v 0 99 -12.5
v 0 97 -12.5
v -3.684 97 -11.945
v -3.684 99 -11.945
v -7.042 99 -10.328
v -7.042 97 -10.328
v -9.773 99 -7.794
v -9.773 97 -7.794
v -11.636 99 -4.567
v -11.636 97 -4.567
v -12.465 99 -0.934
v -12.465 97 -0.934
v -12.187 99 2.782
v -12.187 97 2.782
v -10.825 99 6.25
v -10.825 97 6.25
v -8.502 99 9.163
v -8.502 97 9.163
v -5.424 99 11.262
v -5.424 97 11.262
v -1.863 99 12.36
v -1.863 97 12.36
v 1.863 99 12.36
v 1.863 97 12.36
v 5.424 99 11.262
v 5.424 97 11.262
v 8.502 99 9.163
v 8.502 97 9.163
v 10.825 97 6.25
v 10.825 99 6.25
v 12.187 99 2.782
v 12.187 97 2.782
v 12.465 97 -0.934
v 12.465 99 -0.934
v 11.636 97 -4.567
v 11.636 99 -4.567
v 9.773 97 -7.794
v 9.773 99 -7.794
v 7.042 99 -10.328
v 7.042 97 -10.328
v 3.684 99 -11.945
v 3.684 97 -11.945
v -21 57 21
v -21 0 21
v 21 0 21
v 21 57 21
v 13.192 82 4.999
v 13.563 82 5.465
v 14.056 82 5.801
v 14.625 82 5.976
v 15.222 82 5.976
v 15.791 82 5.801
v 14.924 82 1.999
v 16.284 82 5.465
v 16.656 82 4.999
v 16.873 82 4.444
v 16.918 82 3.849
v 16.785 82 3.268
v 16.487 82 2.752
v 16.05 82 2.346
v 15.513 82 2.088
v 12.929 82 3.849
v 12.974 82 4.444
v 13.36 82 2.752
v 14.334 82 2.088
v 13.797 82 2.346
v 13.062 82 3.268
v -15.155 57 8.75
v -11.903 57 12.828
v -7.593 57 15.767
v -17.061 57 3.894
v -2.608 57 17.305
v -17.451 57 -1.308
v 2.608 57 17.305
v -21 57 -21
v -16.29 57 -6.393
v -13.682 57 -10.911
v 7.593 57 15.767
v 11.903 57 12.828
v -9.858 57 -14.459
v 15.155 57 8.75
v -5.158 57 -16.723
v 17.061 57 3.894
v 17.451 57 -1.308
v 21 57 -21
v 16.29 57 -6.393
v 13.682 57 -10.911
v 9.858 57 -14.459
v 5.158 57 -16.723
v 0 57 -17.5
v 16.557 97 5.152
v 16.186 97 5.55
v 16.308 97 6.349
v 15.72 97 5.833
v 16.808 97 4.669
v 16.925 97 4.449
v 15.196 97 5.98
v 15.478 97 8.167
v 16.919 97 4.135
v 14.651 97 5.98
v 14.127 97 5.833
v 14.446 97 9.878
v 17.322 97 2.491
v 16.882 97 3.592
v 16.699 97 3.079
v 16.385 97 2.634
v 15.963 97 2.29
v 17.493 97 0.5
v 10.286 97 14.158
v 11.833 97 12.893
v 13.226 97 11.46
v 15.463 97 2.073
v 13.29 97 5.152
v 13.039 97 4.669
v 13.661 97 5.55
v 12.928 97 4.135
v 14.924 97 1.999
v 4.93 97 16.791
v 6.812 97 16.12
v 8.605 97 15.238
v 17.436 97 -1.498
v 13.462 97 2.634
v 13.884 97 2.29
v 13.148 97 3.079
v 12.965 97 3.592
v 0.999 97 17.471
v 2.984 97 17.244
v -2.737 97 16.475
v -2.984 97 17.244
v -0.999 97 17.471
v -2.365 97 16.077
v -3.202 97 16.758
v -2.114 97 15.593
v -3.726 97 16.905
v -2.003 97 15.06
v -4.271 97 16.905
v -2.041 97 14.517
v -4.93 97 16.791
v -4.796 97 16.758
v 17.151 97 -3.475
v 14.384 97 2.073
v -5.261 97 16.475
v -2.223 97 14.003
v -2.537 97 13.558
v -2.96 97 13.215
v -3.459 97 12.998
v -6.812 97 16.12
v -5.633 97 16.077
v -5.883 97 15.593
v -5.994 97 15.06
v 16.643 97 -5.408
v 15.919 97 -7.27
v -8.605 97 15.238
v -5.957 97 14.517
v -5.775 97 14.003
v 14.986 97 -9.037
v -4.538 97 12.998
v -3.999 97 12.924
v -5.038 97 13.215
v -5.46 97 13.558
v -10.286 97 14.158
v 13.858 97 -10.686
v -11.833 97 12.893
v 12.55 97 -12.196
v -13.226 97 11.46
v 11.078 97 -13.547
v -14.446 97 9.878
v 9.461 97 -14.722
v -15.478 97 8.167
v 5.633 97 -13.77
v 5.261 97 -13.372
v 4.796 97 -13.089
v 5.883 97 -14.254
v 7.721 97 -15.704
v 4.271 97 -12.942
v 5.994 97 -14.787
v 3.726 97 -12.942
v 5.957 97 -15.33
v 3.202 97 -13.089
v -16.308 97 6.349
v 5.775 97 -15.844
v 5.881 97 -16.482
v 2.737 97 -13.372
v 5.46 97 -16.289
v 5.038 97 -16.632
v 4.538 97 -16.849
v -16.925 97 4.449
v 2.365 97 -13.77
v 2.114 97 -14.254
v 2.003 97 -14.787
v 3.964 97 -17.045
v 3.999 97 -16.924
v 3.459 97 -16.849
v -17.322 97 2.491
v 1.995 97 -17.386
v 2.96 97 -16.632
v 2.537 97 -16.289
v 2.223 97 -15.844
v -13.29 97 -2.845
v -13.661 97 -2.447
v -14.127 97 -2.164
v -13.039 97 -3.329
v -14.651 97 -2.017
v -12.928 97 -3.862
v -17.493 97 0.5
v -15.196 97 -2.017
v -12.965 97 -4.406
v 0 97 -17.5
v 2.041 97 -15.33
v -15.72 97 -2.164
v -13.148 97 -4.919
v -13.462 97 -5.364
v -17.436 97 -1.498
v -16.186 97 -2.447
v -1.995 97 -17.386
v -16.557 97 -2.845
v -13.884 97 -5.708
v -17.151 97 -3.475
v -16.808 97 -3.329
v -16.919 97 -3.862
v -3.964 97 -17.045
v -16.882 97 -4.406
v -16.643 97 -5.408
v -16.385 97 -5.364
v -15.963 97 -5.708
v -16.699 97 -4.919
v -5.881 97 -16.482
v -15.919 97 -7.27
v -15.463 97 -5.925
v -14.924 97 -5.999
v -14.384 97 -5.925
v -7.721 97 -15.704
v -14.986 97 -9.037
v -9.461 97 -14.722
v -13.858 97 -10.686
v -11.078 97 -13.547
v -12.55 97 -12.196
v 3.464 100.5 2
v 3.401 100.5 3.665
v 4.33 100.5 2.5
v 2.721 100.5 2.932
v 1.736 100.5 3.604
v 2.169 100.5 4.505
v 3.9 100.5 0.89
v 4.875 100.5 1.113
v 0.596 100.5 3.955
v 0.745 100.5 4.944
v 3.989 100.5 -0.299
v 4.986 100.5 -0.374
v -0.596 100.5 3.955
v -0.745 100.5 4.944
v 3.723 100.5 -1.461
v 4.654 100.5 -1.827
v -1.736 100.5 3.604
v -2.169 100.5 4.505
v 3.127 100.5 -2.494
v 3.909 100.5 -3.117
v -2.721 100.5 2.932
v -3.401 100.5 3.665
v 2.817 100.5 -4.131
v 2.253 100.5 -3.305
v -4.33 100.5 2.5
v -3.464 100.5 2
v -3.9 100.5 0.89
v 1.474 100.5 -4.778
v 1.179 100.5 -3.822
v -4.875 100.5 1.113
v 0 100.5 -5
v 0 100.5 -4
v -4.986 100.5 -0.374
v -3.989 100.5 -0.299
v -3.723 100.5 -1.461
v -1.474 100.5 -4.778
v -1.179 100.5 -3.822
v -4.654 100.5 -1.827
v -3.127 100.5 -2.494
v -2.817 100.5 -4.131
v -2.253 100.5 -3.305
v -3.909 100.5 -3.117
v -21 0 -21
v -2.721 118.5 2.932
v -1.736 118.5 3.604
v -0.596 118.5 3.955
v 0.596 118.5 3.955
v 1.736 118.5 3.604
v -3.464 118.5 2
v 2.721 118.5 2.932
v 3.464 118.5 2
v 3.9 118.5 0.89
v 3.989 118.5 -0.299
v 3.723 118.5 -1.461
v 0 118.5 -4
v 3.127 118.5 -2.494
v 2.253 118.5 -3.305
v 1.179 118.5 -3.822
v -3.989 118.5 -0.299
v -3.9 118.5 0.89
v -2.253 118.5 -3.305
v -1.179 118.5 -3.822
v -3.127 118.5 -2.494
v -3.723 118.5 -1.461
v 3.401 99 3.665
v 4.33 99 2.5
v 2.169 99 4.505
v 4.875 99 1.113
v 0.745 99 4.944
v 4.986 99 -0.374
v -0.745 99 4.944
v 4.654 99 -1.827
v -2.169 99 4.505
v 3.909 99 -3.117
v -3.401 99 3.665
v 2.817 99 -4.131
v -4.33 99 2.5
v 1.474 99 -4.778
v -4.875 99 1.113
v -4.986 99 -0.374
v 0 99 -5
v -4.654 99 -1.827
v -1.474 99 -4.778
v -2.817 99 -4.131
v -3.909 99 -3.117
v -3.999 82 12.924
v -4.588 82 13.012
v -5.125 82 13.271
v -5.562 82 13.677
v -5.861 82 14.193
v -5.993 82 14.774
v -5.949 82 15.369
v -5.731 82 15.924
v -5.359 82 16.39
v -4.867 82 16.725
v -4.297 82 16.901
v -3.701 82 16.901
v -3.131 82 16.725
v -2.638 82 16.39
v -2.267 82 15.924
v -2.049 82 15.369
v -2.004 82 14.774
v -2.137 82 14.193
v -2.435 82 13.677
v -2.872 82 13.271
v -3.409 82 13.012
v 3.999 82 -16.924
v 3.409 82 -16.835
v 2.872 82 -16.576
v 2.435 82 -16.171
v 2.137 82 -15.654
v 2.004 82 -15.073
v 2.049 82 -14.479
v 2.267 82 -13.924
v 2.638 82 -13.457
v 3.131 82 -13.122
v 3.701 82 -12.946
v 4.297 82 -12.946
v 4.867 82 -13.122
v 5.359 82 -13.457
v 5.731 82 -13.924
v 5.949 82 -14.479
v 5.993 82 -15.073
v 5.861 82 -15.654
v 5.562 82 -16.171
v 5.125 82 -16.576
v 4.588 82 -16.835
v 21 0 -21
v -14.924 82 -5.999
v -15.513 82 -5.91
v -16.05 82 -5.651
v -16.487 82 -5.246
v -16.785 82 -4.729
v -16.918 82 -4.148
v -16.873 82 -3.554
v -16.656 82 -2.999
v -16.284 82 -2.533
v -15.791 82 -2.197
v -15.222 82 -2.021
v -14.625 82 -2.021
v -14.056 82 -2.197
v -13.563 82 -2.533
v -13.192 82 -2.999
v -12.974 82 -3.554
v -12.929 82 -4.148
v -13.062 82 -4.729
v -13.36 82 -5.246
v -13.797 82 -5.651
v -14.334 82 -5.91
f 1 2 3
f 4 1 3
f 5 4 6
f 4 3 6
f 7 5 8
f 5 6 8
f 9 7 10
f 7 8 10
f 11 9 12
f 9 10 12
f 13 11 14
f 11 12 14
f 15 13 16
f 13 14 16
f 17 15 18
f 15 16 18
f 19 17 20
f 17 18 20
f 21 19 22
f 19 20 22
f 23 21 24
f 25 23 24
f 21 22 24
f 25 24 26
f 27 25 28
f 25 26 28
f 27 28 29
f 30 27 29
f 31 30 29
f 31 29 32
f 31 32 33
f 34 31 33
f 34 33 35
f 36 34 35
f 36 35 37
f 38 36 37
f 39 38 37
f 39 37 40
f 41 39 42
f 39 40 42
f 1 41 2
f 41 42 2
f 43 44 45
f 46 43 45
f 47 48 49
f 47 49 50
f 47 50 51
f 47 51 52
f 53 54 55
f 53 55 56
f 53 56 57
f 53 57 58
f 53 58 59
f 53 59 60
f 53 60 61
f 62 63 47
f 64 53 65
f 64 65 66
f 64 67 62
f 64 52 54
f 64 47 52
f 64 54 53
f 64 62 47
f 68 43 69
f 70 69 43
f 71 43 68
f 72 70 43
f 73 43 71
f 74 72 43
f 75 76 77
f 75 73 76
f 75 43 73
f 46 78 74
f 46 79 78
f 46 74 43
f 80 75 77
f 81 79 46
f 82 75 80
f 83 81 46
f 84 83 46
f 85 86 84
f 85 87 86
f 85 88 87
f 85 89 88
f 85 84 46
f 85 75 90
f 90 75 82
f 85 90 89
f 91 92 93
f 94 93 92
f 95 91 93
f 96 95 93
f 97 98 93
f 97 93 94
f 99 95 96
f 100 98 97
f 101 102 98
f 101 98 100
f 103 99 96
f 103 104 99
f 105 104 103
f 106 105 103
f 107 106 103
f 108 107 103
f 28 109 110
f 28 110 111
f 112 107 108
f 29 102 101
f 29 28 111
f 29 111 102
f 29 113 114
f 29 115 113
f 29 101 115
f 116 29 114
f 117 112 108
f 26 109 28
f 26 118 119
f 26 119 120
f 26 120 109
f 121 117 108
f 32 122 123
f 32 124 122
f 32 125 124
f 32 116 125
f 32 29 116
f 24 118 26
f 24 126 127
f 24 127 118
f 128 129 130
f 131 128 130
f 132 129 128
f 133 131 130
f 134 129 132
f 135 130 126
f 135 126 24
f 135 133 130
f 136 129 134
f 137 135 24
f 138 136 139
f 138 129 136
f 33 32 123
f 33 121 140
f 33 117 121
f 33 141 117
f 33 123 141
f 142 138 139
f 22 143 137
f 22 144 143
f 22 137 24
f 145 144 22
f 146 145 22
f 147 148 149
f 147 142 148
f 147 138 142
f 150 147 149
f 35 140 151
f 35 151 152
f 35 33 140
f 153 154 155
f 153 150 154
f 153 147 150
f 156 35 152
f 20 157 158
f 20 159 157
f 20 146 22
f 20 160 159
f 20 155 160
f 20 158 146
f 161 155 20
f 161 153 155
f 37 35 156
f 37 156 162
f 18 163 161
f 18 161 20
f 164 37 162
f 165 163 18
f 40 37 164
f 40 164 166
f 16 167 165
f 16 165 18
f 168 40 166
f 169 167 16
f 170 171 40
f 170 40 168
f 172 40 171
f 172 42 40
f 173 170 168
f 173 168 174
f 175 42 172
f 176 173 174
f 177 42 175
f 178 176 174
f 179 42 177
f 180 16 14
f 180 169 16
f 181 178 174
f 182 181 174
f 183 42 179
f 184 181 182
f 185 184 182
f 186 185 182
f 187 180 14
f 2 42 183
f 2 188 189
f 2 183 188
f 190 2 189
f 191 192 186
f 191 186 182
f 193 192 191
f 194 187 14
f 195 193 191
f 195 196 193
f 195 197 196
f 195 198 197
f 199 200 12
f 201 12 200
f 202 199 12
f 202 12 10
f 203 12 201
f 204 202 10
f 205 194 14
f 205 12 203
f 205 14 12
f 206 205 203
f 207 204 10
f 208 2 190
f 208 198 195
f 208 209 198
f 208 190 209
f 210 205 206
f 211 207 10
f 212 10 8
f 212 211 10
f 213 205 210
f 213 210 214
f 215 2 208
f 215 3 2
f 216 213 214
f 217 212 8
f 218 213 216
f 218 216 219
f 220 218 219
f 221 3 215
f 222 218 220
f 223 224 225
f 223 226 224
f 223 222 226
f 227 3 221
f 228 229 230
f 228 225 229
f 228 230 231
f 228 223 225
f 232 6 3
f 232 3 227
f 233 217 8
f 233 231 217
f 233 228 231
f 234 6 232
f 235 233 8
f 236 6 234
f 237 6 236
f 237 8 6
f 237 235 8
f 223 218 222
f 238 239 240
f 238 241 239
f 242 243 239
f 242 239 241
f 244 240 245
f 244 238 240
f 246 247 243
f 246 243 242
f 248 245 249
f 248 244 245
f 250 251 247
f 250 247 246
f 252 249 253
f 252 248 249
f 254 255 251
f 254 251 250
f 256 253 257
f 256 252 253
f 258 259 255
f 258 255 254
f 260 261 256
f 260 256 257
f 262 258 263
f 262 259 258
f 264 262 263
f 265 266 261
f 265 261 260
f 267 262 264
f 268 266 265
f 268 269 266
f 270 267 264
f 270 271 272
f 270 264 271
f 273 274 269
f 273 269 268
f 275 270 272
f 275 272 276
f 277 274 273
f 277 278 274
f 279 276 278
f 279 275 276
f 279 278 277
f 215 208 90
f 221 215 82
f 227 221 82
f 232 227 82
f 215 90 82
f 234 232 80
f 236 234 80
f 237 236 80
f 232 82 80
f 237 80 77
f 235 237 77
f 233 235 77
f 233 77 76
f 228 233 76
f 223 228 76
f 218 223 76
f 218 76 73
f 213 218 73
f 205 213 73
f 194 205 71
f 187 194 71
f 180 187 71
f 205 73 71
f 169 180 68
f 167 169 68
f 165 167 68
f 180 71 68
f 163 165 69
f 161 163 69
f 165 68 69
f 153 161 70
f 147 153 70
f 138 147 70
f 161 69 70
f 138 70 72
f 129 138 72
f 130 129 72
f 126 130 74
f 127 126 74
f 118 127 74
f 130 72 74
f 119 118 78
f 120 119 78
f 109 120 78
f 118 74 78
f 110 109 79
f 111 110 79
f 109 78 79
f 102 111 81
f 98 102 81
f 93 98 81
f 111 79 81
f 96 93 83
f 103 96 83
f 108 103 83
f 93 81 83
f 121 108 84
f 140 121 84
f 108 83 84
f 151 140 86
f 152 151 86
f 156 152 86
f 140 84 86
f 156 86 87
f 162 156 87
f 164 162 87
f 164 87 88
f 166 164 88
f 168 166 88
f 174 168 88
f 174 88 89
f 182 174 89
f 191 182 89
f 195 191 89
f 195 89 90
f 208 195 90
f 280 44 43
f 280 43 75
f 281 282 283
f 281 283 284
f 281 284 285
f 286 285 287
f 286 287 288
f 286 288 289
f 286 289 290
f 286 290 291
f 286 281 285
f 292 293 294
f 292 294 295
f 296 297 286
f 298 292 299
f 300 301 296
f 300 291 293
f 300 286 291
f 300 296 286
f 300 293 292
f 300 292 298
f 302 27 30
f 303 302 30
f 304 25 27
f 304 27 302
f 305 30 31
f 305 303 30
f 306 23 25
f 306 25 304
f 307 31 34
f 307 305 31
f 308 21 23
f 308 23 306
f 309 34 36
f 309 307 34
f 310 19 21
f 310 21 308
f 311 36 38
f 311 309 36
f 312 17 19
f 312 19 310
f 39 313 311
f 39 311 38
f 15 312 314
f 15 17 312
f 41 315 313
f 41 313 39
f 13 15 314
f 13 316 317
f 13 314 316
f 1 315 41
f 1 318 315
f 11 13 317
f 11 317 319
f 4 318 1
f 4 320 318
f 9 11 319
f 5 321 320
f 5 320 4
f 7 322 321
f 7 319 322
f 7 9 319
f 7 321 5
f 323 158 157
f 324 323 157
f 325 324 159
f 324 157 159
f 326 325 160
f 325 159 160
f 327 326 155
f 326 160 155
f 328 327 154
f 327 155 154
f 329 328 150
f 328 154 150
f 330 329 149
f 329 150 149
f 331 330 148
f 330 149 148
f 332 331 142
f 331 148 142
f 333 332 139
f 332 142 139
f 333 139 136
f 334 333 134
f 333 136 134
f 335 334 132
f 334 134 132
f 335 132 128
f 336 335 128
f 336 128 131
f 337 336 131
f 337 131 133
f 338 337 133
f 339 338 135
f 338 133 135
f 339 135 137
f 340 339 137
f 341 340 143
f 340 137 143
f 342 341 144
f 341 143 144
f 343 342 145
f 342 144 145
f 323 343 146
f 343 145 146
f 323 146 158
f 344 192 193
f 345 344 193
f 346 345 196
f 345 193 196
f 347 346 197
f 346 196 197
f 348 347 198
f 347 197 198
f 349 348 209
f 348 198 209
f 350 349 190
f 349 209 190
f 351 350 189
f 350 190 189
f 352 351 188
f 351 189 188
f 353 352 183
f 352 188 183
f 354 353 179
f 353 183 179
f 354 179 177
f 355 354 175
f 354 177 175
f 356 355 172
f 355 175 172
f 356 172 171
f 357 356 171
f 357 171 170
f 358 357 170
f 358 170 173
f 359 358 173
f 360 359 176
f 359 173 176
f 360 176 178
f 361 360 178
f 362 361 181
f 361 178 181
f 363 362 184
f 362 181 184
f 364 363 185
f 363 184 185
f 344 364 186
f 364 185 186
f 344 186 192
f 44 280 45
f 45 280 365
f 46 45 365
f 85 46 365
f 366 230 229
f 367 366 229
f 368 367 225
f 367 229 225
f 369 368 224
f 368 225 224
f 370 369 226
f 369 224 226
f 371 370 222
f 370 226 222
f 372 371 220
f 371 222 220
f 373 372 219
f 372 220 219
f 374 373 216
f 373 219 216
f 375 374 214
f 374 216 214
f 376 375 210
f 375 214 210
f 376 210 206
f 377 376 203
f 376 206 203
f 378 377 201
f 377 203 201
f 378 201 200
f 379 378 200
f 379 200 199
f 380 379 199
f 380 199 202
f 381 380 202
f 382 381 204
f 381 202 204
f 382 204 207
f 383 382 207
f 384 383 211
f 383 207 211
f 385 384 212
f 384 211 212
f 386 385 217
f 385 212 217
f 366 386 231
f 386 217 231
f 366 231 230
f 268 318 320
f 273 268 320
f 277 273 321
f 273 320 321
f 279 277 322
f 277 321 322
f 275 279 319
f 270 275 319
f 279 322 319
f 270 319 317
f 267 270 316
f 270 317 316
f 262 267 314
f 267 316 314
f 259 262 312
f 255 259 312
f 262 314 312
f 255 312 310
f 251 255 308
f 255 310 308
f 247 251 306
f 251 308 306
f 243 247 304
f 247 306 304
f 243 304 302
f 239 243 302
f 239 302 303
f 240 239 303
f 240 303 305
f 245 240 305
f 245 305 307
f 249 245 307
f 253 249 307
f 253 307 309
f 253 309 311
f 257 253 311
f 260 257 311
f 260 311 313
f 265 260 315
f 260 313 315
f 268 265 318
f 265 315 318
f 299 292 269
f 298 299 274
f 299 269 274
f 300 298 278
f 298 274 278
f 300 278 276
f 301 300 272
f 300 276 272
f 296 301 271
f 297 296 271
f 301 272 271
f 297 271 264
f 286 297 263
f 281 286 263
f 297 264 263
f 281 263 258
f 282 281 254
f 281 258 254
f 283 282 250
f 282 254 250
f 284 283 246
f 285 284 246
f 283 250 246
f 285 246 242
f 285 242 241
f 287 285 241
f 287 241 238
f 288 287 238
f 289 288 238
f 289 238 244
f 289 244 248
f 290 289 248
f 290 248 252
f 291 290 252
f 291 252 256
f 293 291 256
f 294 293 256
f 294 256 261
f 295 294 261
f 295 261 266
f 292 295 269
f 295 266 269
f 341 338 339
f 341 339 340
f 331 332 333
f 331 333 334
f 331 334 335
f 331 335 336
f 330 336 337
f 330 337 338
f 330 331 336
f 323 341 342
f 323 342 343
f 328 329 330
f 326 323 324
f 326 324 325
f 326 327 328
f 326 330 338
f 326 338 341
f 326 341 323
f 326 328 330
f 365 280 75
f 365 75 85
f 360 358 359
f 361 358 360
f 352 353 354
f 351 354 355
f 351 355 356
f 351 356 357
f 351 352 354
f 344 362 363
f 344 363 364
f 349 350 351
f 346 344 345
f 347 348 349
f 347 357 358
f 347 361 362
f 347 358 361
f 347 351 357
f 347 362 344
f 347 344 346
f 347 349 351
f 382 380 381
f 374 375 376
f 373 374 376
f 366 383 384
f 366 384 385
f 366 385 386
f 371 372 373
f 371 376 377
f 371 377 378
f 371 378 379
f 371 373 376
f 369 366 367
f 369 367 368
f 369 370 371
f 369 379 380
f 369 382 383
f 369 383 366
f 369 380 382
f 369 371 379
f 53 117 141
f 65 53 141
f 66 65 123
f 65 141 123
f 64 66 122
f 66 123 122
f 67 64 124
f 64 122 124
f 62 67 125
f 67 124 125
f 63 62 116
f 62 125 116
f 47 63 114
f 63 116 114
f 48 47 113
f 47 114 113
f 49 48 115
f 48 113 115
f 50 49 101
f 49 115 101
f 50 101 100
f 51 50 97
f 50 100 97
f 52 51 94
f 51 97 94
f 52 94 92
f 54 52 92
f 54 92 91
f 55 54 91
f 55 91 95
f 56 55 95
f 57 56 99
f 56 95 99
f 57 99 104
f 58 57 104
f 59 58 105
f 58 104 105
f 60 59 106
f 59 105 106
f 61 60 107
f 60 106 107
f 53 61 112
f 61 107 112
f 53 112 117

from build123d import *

# Parameters (mm, degrees)
SKETCH_1_W          = 42
SKETCH_1_H          = 42
EXTRUDE_1_DEPTH     = 57
EXTRUDE_START       = 57
SKETCH_2_R          = 17.5
EXTRUDE_2_DEPTH     = 40
EXTRUDE_START_2     = 97
SKETCH_3_R          = 12.5
EXTRUDE_3_DEPTH     = 2
EXTRUDE_START_3     = 99
SKETCH_4_R          = 5
EXTRUDE_4_DEPTH     = 1.5
EXTRUDE_START_4     = 100.5
SKETCH_5_R          = 4
EXTRUDE_5_DEPTH     = 18
CUT_EXTRUDE_START   = 97
SKETCH_6_R          = 2
CUT_EXTRUDE_2_DEPTH = 15


with BuildPart() as part:
    # 草图1 → 凸台-拉伸1 (new body)
    with BuildSketch(Plane(origin=(0, 0, 0), x_dir=(1, 0, 0), z_dir=(0, 1, 0))):
        Rectangle(SKETCH_1_W, SKETCH_1_H)
    extrude(amount=EXTRUDE_1_DEPTH)

    # 草图2 → 凸台-拉伸2 (add)
    with BuildSketch(Plane(origin=(0, 0, 0), x_dir=(1, 0, 0), z_dir=(0, 1, 0)).offset(EXTRUDE_START)):
        with Locations(Location((0, 0, 0), (0, 0, 90))):
            Circle(SKETCH_2_R)
    extrude(amount=EXTRUDE_2_DEPTH)

    # 草图3 → 凸台-拉伸3 (add)
    with BuildSketch(Plane(origin=(0, 0, 0), x_dir=(1, 0, 0), z_dir=(0, 1, 0)).offset(EXTRUDE_START_2)):
        with Locations(Location((0, 0, 0), (0, 0, 90))):
            Circle(SKETCH_3_R)
    extrude(amount=EXTRUDE_3_DEPTH)

    # 草图4 → 凸台-拉伸4 (add)
    with BuildSketch(Plane(origin=(0, 0, 0), x_dir=(1, 0, 0), z_dir=(0, 1, 0)).offset(EXTRUDE_START_3)):
        with Locations(Location((0, 0, 0), (0, 0, 90))):
            Circle(SKETCH_4_R)
    extrude(amount=EXTRUDE_4_DEPTH)

    # 草图5 → 凸台-拉伸5 (add)
    with BuildSketch(Plane(origin=(0, 0, 0), x_dir=(1, 0, 0), z_dir=(0, 1, 0)).offset(EXTRUDE_START_4)):
        with Locations(Location((0, 0, 0), (0, 0, 90))):
            Circle(SKETCH_5_R)
    extrude(amount=EXTRUDE_5_DEPTH)

    # 草图6 → 切除-拉伸2 (cut)
    with BuildSketch(Plane(origin=(0, 0, 0), x_dir=(1, 0, 0), z_dir=(0, 1, 0)).offset(CUT_EXTRUDE_START)):
        with Locations(Location((3.998754247, 14.923554016, 0), (0, 0, 90))):
            Circle(SKETCH_6_R)
        with Locations(Location((14.923554016, -3.998754247, 0), (0, 0, 90))):
            Circle(SKETCH_6_R)
        with Locations(Location((-3.998754247, -14.923554016, 0), (0, 0, 90))):
            Circle(SKETCH_6_R)
        with Locations(Location((-14.923554016, 3.998754247, 0), (0, 0, 90))):
            Circle(SKETCH_6_R)
    extrude(amount=-CUT_EXTRUDE_2_DEPTH, mode=Mode.SUBTRACT)


solid = part.part
